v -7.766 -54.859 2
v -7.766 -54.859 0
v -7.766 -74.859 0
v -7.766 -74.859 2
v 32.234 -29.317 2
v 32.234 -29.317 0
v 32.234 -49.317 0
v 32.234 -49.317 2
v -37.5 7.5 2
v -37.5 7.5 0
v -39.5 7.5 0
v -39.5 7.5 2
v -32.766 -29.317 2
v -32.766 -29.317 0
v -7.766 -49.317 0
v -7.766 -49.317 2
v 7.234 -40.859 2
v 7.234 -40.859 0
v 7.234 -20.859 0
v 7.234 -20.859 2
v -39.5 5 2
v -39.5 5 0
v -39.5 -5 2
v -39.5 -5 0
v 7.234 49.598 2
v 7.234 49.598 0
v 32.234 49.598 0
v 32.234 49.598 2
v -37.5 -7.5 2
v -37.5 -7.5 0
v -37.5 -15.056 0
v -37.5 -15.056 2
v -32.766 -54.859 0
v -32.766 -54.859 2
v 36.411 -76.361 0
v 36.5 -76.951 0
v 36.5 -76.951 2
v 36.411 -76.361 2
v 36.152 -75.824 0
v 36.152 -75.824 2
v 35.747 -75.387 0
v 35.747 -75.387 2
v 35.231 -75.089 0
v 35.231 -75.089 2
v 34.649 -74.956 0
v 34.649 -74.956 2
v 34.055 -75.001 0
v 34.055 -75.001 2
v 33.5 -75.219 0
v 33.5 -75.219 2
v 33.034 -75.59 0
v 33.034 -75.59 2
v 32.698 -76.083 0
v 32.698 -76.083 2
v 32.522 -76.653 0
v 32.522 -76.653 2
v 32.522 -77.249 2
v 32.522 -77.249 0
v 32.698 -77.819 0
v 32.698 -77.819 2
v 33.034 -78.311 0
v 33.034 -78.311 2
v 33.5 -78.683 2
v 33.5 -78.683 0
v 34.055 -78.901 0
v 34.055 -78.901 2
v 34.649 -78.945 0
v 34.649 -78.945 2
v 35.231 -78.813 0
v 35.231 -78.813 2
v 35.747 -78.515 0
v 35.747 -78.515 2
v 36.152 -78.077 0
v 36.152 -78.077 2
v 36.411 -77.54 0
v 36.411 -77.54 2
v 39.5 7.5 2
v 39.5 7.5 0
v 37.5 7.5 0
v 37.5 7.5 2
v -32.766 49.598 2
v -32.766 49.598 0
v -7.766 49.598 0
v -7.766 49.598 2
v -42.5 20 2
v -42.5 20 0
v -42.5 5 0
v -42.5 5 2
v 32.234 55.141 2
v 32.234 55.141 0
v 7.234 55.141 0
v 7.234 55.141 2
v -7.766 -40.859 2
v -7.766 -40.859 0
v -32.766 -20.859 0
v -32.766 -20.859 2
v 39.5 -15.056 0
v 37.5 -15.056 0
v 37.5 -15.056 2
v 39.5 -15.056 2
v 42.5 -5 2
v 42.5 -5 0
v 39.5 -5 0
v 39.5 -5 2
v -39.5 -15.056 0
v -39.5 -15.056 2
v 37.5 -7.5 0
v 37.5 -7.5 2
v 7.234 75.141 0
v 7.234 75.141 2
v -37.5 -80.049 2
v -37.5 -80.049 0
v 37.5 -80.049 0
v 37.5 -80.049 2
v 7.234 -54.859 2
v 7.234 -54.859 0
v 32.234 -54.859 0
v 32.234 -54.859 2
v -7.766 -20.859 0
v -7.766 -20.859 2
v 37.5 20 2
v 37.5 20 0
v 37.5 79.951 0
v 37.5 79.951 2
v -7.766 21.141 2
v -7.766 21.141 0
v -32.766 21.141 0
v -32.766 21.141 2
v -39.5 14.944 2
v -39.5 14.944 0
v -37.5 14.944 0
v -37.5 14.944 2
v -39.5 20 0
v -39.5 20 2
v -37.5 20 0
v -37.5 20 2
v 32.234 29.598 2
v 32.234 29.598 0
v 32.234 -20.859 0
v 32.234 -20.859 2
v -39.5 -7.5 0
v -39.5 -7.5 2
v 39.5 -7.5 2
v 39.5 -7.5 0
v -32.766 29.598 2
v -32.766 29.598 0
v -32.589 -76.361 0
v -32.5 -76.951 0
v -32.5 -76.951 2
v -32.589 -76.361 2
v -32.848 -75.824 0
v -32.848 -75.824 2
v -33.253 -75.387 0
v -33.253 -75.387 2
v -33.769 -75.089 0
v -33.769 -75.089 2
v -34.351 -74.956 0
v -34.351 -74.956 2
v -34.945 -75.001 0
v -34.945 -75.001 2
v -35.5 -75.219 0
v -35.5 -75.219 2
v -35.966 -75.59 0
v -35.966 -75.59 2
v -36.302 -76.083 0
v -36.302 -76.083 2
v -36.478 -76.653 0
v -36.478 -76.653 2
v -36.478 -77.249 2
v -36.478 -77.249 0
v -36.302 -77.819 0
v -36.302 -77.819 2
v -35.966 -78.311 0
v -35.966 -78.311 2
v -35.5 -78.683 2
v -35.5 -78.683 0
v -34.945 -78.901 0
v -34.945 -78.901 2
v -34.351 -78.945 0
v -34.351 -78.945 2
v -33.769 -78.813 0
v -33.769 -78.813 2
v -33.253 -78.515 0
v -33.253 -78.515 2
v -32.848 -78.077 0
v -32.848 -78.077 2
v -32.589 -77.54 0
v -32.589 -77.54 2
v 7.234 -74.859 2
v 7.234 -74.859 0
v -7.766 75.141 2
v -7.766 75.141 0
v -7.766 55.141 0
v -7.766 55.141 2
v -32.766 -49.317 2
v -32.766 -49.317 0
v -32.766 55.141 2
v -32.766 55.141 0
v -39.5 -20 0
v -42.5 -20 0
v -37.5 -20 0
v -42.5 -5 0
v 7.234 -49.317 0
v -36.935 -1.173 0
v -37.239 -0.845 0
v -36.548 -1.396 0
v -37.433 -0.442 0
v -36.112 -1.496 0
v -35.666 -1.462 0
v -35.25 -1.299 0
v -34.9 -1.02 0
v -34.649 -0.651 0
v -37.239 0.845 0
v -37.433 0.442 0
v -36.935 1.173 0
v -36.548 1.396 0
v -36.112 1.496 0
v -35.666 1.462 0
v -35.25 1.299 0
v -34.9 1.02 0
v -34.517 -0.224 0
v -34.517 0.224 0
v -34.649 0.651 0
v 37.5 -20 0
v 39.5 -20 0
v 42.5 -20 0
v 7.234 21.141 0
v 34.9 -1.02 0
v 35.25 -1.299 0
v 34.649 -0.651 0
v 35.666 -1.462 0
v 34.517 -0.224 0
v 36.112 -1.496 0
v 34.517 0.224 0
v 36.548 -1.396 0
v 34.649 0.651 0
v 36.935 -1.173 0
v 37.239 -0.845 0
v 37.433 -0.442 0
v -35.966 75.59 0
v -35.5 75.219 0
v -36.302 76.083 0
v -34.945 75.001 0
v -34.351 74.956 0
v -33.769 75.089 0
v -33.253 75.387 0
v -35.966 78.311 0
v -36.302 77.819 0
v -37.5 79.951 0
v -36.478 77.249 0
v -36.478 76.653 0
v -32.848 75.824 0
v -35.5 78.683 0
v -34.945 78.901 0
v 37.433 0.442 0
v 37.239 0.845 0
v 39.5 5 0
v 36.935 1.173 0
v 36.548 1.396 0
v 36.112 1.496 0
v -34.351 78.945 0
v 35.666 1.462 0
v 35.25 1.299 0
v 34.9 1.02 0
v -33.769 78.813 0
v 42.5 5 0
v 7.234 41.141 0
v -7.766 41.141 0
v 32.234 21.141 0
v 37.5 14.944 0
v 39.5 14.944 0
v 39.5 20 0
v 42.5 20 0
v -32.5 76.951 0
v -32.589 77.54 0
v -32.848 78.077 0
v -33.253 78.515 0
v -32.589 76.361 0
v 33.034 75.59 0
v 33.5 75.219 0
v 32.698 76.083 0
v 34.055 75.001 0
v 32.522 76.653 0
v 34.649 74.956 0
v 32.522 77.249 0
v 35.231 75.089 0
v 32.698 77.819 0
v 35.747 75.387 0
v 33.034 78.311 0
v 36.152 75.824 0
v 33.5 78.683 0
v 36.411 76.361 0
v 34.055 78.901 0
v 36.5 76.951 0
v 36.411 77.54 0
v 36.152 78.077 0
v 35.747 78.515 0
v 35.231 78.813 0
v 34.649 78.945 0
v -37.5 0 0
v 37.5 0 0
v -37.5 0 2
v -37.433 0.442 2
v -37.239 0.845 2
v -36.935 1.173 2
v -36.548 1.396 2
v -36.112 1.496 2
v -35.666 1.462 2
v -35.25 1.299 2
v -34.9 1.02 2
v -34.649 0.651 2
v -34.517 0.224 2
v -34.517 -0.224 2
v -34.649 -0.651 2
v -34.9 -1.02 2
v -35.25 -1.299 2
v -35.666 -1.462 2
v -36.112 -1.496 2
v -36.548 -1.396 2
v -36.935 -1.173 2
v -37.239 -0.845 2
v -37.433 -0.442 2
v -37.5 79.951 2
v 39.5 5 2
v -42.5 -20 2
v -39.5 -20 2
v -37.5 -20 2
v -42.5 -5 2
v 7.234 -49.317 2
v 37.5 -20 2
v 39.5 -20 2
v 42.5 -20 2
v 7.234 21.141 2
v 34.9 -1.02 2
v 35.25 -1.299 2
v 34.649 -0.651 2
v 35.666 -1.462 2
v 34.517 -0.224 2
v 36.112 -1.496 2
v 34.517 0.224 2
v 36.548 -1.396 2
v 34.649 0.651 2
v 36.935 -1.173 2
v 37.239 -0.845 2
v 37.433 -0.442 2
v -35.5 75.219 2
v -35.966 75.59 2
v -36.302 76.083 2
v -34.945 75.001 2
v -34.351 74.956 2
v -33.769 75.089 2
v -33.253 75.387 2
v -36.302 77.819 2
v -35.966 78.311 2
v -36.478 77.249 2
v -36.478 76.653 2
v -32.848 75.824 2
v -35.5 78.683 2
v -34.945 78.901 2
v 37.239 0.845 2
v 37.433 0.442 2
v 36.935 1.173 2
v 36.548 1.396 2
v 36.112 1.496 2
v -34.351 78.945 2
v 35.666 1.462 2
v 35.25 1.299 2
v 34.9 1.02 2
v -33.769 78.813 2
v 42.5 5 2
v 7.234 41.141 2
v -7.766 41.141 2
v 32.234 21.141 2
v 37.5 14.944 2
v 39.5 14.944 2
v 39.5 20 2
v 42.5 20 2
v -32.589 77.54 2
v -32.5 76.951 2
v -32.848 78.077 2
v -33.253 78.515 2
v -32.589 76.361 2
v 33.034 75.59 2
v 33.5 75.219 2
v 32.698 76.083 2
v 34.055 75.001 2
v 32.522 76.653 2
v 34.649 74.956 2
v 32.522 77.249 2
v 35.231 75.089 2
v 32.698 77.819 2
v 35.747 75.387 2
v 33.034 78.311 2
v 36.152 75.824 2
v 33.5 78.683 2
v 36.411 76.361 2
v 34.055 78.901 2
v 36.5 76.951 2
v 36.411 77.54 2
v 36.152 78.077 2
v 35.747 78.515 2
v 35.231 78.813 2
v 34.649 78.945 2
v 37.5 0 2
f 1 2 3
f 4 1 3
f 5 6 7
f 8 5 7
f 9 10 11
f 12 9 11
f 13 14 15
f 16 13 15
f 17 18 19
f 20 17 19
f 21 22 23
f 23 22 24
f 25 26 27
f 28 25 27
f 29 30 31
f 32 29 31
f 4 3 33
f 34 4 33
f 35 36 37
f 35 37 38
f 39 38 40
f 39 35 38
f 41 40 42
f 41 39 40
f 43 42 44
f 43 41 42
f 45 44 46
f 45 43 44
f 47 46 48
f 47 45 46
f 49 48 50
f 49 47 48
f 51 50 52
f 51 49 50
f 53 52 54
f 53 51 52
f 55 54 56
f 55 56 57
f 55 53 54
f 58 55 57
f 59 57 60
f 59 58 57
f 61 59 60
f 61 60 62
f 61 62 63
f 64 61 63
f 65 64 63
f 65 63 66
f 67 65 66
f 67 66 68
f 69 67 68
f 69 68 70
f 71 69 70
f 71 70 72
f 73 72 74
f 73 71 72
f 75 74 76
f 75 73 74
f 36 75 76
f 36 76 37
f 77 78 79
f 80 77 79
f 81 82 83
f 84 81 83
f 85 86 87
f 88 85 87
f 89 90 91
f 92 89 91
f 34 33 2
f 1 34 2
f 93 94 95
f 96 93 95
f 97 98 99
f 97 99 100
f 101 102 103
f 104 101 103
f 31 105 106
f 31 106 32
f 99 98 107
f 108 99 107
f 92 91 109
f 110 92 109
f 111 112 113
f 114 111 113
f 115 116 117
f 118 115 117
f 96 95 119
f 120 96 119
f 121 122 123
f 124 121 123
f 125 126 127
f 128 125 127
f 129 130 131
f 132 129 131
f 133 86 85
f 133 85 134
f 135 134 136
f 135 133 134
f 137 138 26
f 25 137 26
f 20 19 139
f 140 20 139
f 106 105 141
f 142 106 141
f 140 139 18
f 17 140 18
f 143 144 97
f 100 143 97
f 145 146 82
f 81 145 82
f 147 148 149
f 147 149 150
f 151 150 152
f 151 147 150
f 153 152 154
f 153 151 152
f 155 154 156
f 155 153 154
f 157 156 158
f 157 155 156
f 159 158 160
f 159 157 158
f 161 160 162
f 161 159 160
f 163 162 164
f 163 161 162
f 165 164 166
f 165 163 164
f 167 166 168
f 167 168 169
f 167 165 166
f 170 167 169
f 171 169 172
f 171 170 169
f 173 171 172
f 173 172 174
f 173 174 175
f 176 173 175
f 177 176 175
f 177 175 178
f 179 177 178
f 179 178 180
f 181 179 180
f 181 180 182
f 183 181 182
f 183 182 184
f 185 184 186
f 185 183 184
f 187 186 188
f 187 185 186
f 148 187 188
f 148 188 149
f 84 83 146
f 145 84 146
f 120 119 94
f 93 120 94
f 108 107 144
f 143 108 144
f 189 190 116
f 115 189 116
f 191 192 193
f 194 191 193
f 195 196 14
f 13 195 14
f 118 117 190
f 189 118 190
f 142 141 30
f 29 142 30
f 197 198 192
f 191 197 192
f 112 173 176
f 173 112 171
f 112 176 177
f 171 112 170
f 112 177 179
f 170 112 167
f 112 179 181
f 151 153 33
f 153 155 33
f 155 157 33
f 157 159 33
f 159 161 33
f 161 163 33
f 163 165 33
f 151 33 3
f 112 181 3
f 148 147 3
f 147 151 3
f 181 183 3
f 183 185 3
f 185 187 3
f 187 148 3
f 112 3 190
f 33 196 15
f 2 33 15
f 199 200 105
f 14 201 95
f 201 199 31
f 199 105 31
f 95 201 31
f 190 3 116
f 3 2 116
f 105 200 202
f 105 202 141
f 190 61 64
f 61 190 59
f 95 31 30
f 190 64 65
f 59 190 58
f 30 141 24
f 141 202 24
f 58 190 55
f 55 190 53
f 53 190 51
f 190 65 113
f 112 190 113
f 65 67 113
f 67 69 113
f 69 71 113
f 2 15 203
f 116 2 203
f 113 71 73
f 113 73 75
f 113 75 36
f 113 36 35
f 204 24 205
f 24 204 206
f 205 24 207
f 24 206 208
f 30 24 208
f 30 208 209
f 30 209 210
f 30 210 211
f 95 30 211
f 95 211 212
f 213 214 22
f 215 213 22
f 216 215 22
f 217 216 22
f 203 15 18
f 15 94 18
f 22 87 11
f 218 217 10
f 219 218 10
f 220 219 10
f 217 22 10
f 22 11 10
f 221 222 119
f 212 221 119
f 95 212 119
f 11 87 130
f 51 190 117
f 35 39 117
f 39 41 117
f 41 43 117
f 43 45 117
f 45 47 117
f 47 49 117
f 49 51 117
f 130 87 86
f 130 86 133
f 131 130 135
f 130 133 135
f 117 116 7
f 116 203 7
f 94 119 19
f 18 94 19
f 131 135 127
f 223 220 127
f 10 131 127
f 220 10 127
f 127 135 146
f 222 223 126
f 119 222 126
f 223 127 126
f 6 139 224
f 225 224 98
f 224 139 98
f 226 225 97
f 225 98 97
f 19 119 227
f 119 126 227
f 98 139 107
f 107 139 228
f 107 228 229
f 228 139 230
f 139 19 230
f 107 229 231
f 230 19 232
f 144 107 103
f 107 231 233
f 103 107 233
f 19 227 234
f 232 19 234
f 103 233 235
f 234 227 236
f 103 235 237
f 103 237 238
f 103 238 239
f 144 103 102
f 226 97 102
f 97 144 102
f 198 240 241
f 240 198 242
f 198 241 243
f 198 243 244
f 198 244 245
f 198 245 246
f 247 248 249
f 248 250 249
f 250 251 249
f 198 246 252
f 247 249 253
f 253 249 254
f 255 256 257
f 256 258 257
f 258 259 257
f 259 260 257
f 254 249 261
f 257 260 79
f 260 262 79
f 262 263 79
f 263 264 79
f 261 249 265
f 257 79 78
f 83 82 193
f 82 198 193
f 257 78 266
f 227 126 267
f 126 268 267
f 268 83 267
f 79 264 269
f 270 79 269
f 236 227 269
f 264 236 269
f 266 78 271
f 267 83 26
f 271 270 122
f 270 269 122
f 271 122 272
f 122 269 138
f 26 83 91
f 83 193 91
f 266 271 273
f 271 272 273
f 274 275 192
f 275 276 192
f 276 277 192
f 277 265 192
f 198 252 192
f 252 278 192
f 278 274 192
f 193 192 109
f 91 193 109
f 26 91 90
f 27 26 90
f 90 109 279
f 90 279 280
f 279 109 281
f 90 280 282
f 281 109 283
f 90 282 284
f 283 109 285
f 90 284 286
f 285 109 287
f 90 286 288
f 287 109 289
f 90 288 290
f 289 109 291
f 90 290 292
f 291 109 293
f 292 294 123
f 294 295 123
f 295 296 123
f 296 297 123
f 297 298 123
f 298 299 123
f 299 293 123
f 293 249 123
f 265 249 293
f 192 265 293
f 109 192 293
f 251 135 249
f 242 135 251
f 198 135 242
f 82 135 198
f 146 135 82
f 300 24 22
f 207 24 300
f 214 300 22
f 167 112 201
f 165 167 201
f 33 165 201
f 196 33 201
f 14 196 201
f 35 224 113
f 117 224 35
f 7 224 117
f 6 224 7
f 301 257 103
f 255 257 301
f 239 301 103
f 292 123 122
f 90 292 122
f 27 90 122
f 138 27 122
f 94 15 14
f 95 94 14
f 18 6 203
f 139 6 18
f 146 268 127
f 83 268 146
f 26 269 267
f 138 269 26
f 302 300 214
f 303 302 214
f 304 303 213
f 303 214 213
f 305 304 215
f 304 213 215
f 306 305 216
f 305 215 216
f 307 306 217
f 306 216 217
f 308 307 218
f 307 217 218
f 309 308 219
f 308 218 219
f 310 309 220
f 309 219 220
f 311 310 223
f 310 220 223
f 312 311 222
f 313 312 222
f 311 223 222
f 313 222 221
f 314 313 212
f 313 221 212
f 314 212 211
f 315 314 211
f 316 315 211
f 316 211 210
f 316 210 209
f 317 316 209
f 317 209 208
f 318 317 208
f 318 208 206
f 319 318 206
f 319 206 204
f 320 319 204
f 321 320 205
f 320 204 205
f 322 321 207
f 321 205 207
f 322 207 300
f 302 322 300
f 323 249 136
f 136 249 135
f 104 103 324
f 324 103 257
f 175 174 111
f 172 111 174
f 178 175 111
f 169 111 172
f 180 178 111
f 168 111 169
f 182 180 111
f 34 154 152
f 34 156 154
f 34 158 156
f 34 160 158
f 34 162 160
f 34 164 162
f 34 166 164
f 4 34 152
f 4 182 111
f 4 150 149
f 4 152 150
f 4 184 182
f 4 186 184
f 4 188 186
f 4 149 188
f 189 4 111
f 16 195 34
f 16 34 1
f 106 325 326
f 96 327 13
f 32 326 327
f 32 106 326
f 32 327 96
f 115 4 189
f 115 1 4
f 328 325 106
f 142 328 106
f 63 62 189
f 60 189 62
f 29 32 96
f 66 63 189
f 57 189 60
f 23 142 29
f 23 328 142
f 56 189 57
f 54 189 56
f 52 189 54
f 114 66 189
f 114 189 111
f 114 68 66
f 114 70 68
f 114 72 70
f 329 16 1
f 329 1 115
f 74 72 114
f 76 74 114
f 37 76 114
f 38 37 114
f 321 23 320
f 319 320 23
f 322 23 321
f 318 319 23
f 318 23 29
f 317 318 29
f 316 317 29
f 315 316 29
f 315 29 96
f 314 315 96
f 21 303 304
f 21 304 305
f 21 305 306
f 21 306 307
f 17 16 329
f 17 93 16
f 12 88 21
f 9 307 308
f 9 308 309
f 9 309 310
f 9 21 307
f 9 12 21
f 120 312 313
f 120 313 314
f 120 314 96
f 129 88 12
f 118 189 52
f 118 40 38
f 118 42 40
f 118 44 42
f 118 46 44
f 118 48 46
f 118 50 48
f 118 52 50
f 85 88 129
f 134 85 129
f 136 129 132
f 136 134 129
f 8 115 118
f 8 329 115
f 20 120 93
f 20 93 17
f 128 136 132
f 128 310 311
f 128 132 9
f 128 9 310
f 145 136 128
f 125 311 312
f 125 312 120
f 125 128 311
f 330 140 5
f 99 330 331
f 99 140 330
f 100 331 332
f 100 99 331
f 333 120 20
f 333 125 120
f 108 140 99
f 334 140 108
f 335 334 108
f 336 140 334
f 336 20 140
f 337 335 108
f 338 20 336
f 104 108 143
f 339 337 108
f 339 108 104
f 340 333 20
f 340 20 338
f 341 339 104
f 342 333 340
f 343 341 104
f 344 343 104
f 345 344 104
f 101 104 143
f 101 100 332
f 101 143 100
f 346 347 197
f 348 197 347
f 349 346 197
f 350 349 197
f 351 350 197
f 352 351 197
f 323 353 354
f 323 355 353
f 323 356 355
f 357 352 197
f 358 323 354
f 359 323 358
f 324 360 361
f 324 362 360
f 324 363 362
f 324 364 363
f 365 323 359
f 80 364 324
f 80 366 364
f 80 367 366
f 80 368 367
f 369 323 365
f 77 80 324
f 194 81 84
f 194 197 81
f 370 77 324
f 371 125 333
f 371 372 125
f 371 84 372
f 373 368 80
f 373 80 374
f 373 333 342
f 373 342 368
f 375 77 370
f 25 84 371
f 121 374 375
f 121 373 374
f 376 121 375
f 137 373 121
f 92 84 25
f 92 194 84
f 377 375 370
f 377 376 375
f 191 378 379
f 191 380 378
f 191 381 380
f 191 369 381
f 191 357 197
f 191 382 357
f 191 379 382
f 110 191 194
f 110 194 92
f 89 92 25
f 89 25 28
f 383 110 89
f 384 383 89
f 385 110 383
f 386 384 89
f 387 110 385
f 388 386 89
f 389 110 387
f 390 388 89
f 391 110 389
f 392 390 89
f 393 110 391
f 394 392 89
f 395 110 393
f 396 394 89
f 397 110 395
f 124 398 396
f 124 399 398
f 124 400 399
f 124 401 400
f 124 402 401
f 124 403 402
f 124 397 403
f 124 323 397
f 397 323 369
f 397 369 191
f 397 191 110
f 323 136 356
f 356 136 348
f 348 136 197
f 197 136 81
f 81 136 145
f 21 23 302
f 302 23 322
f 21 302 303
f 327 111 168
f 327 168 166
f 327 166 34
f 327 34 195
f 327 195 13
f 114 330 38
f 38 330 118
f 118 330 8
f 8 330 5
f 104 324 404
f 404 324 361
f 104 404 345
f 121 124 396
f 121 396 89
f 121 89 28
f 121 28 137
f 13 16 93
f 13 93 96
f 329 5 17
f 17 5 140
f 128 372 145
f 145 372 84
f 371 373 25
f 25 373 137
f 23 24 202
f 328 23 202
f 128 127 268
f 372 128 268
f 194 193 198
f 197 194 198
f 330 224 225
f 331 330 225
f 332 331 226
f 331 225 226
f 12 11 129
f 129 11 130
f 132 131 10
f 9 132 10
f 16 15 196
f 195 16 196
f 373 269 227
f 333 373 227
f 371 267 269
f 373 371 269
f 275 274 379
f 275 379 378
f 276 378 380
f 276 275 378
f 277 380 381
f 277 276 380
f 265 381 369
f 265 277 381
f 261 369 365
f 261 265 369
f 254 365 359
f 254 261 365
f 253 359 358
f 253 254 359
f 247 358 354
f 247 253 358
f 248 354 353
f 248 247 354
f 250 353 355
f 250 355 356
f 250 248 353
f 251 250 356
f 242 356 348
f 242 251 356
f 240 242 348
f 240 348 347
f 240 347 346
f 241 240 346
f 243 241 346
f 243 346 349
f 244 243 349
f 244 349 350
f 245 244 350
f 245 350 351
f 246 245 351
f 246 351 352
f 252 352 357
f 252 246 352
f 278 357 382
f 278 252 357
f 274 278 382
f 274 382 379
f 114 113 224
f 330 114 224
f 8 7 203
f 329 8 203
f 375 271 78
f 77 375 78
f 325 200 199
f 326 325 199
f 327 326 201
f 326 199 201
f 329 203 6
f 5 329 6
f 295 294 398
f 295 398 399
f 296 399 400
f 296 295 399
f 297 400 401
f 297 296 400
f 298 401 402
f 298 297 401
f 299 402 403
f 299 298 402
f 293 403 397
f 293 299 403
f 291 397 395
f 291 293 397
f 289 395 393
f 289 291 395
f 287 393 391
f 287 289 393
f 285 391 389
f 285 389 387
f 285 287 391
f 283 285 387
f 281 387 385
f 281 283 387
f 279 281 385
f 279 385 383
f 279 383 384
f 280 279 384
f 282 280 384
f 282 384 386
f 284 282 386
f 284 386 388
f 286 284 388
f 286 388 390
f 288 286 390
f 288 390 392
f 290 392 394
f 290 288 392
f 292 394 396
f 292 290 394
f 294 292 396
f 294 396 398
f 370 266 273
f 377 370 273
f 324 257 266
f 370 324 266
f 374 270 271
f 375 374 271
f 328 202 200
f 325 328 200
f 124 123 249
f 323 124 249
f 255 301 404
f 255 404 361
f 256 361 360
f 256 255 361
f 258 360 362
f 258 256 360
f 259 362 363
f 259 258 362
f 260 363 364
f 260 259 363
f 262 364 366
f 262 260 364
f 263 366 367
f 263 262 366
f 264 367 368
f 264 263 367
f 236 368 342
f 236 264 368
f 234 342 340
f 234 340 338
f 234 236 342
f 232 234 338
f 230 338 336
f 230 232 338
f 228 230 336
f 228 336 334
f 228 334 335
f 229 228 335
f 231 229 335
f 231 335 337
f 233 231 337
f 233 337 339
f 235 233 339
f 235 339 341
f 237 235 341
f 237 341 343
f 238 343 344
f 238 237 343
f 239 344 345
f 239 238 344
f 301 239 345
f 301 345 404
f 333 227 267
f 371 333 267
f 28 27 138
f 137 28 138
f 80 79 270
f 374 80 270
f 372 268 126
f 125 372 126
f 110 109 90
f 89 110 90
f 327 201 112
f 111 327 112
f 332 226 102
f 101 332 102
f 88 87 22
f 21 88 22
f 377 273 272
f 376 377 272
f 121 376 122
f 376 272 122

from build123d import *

# Parameters (mm, degrees)
F0_R     = 2
F0_R_2   = 1.5
F0_W     = 2
F0_H     = 5.0564210489
F0_H_2   = 4.9435789511
F1_DEPTH = 2


with BuildPart() as f1:
    # F0 (on Top) → F1 (new body)
    with BuildSketch(Plane.XY):
        Polygon((37.5, 79.9508376047), (-37.5, 79.9508376047), (-37.5, 20), (-37.5, 14.9435789511), (-37.5, 7.5), (-37.5, 0), (-37.5, -7.5), (-37.5, -15.0564210489), (-37.5, -20), (-37.5, -80.0491623953), (37.5, -80.0491623953), (37.5, -20), (37.5, -15.0564210489), (37.5, -7.5), (37.5, 0), (37.5, 7.5), (37.5, 14.9435789511), (37.5, 20), align=None)
        with Locations((-34.5, -76.9508376047)):
            Circle(F0_R, mode=Mode.SUBTRACT)
        Polygon((-32.7663309872, -54.8594370484), (-7.7663309872, -54.8594370484), (-7.7663309872, -74.8594370484), align=None, mode=Mode.SUBTRACT)
        Polygon((-32.7663309872, -49.3169614673), (-32.7663309872, -29.3169614673), (-7.7663309872, -49.3169614673), align=None, mode=Mode.SUBTRACT)
        Polygon((-32.7663309872, -20.8594370484), (-7.7663309872, -20.8594370484), (-7.7663309872, -40.8594370484), align=None, mode=Mode.SUBTRACT)
        Polygon((7.2336690128, -74.8594370484), (7.2336690128, -54.8594370484), (32.2336690128, -54.8594370484), align=None, mode=Mode.SUBTRACT)
        with Locations((34.5, -76.9508376047)):
            Circle(F0_R, mode=Mode.SUBTRACT)
        Polygon((32.2336690128, -49.3169614673), (7.2336690128, -49.3169614673), (32.2336690128, -29.3169614673), align=None, mode=Mode.SUBTRACT)
        Polygon((7.2336690128, -40.8594370484), (7.2336690128, -20.8594370484), (32.2336690128, -20.8594370484), align=None, mode=Mode.SUBTRACT)
        with BuildLine():
            ThreePointArc((-34.5, 0), (-36, -1.5), (-37.5, 0))
            ThreePointArc((-37.5, 0), (-36, 1.5), (-34.5, 0))
        make_face(mode=Mode.SUBTRACT)
        Polygon((-7.7663309872, 41.1405629516), (-7.7663309872, 21.1405629516), (-32.7663309872, 21.1405629516), align=None, mode=Mode.SUBTRACT)
        Polygon((-7.7663309872, 49.5980873704), (-32.7663309872, 29.5980873704), (-32.7663309872, 49.5980873704), align=None, mode=Mode.SUBTRACT)
        with Locations((-34.5, 76.9508376047)):
            Circle(F0_R, mode=Mode.SUBTRACT)
        Polygon((-7.7663309872, 55.1405629516), (-32.7663309872, 55.1405629516), (-7.7663309872, 75.1405629516), align=None, mode=Mode.SUBTRACT)
        Polygon((32.2336690128, 21.1405629516), (7.2336690128, 21.1405629516), (7.2336690128, 41.1405629516), align=None, mode=Mode.SUBTRACT)
        Polygon((32.2336690128, 49.5980873704), (32.2336690128, 29.5980873704), (7.2336690128, 49.5980873704), align=None, mode=Mode.SUBTRACT)
        with Locations((36, 0)):
            Circle(F0_R_2, mode=Mode.SUBTRACT)
        Polygon((32.2336690128, 55.1405629516), (7.2336690128, 55.1405629516), (7.2336690128, 75.1405629516), align=None, mode=Mode.SUBTRACT)
        with Locations((34.5, 76.9508376047)):
            Circle(F0_R, mode=Mode.SUBTRACT)
        Polygon((39.5, 7.5), (37.5, 7.5), (37.5, 0), (37.5, -7.5), (39.5, -7.5), (39.5, -5), (39.5, 5), align=None)
        Polygon((-37.5, 0), (-37.5, 7.5), (-39.5, 7.5), (-39.5, 5), (-39.5, -5), (-39.5, -7.5), (-37.5, -7.5), align=None)
        with Locations((38.5, 17.4717894755)):
            Rectangle(F0_W, F0_H)
        with Locations((38.5, -17.5282105245)):
            Rectangle(F0_W, F0_H_2)
        with Locations((-38.5, -17.5282105245)):
            Rectangle(F0_W, F0_H_2)
        with Locations((-38.5, 17.4717894755)):
            Rectangle(F0_W, F0_H)
        Polygon((-39.5, 14.9435789511), (-39.5, 20), (-42.5, 20), (-42.5, 5), (-39.5, 5), (-39.5, 7.5), align=None)
        Polygon((42.5, 20), (39.5, 20), (39.5, 14.9435789511), (39.5, 7.5), (39.5, 5), (42.5, 5), align=None)
        Polygon((42.5, -20), (42.5, -5), (39.5, -5), (39.5, -7.5), (39.5, -15.0564210489), (39.5, -20), align=None)
        Polygon((-39.5, -5), (-42.5, -5), (-42.5, -20), (-39.5, -20), (-39.5, -15.0564210489), (-39.5, -7.5), align=None)
    extrude(amount=F1_DEPTH)


solid = f1.part
